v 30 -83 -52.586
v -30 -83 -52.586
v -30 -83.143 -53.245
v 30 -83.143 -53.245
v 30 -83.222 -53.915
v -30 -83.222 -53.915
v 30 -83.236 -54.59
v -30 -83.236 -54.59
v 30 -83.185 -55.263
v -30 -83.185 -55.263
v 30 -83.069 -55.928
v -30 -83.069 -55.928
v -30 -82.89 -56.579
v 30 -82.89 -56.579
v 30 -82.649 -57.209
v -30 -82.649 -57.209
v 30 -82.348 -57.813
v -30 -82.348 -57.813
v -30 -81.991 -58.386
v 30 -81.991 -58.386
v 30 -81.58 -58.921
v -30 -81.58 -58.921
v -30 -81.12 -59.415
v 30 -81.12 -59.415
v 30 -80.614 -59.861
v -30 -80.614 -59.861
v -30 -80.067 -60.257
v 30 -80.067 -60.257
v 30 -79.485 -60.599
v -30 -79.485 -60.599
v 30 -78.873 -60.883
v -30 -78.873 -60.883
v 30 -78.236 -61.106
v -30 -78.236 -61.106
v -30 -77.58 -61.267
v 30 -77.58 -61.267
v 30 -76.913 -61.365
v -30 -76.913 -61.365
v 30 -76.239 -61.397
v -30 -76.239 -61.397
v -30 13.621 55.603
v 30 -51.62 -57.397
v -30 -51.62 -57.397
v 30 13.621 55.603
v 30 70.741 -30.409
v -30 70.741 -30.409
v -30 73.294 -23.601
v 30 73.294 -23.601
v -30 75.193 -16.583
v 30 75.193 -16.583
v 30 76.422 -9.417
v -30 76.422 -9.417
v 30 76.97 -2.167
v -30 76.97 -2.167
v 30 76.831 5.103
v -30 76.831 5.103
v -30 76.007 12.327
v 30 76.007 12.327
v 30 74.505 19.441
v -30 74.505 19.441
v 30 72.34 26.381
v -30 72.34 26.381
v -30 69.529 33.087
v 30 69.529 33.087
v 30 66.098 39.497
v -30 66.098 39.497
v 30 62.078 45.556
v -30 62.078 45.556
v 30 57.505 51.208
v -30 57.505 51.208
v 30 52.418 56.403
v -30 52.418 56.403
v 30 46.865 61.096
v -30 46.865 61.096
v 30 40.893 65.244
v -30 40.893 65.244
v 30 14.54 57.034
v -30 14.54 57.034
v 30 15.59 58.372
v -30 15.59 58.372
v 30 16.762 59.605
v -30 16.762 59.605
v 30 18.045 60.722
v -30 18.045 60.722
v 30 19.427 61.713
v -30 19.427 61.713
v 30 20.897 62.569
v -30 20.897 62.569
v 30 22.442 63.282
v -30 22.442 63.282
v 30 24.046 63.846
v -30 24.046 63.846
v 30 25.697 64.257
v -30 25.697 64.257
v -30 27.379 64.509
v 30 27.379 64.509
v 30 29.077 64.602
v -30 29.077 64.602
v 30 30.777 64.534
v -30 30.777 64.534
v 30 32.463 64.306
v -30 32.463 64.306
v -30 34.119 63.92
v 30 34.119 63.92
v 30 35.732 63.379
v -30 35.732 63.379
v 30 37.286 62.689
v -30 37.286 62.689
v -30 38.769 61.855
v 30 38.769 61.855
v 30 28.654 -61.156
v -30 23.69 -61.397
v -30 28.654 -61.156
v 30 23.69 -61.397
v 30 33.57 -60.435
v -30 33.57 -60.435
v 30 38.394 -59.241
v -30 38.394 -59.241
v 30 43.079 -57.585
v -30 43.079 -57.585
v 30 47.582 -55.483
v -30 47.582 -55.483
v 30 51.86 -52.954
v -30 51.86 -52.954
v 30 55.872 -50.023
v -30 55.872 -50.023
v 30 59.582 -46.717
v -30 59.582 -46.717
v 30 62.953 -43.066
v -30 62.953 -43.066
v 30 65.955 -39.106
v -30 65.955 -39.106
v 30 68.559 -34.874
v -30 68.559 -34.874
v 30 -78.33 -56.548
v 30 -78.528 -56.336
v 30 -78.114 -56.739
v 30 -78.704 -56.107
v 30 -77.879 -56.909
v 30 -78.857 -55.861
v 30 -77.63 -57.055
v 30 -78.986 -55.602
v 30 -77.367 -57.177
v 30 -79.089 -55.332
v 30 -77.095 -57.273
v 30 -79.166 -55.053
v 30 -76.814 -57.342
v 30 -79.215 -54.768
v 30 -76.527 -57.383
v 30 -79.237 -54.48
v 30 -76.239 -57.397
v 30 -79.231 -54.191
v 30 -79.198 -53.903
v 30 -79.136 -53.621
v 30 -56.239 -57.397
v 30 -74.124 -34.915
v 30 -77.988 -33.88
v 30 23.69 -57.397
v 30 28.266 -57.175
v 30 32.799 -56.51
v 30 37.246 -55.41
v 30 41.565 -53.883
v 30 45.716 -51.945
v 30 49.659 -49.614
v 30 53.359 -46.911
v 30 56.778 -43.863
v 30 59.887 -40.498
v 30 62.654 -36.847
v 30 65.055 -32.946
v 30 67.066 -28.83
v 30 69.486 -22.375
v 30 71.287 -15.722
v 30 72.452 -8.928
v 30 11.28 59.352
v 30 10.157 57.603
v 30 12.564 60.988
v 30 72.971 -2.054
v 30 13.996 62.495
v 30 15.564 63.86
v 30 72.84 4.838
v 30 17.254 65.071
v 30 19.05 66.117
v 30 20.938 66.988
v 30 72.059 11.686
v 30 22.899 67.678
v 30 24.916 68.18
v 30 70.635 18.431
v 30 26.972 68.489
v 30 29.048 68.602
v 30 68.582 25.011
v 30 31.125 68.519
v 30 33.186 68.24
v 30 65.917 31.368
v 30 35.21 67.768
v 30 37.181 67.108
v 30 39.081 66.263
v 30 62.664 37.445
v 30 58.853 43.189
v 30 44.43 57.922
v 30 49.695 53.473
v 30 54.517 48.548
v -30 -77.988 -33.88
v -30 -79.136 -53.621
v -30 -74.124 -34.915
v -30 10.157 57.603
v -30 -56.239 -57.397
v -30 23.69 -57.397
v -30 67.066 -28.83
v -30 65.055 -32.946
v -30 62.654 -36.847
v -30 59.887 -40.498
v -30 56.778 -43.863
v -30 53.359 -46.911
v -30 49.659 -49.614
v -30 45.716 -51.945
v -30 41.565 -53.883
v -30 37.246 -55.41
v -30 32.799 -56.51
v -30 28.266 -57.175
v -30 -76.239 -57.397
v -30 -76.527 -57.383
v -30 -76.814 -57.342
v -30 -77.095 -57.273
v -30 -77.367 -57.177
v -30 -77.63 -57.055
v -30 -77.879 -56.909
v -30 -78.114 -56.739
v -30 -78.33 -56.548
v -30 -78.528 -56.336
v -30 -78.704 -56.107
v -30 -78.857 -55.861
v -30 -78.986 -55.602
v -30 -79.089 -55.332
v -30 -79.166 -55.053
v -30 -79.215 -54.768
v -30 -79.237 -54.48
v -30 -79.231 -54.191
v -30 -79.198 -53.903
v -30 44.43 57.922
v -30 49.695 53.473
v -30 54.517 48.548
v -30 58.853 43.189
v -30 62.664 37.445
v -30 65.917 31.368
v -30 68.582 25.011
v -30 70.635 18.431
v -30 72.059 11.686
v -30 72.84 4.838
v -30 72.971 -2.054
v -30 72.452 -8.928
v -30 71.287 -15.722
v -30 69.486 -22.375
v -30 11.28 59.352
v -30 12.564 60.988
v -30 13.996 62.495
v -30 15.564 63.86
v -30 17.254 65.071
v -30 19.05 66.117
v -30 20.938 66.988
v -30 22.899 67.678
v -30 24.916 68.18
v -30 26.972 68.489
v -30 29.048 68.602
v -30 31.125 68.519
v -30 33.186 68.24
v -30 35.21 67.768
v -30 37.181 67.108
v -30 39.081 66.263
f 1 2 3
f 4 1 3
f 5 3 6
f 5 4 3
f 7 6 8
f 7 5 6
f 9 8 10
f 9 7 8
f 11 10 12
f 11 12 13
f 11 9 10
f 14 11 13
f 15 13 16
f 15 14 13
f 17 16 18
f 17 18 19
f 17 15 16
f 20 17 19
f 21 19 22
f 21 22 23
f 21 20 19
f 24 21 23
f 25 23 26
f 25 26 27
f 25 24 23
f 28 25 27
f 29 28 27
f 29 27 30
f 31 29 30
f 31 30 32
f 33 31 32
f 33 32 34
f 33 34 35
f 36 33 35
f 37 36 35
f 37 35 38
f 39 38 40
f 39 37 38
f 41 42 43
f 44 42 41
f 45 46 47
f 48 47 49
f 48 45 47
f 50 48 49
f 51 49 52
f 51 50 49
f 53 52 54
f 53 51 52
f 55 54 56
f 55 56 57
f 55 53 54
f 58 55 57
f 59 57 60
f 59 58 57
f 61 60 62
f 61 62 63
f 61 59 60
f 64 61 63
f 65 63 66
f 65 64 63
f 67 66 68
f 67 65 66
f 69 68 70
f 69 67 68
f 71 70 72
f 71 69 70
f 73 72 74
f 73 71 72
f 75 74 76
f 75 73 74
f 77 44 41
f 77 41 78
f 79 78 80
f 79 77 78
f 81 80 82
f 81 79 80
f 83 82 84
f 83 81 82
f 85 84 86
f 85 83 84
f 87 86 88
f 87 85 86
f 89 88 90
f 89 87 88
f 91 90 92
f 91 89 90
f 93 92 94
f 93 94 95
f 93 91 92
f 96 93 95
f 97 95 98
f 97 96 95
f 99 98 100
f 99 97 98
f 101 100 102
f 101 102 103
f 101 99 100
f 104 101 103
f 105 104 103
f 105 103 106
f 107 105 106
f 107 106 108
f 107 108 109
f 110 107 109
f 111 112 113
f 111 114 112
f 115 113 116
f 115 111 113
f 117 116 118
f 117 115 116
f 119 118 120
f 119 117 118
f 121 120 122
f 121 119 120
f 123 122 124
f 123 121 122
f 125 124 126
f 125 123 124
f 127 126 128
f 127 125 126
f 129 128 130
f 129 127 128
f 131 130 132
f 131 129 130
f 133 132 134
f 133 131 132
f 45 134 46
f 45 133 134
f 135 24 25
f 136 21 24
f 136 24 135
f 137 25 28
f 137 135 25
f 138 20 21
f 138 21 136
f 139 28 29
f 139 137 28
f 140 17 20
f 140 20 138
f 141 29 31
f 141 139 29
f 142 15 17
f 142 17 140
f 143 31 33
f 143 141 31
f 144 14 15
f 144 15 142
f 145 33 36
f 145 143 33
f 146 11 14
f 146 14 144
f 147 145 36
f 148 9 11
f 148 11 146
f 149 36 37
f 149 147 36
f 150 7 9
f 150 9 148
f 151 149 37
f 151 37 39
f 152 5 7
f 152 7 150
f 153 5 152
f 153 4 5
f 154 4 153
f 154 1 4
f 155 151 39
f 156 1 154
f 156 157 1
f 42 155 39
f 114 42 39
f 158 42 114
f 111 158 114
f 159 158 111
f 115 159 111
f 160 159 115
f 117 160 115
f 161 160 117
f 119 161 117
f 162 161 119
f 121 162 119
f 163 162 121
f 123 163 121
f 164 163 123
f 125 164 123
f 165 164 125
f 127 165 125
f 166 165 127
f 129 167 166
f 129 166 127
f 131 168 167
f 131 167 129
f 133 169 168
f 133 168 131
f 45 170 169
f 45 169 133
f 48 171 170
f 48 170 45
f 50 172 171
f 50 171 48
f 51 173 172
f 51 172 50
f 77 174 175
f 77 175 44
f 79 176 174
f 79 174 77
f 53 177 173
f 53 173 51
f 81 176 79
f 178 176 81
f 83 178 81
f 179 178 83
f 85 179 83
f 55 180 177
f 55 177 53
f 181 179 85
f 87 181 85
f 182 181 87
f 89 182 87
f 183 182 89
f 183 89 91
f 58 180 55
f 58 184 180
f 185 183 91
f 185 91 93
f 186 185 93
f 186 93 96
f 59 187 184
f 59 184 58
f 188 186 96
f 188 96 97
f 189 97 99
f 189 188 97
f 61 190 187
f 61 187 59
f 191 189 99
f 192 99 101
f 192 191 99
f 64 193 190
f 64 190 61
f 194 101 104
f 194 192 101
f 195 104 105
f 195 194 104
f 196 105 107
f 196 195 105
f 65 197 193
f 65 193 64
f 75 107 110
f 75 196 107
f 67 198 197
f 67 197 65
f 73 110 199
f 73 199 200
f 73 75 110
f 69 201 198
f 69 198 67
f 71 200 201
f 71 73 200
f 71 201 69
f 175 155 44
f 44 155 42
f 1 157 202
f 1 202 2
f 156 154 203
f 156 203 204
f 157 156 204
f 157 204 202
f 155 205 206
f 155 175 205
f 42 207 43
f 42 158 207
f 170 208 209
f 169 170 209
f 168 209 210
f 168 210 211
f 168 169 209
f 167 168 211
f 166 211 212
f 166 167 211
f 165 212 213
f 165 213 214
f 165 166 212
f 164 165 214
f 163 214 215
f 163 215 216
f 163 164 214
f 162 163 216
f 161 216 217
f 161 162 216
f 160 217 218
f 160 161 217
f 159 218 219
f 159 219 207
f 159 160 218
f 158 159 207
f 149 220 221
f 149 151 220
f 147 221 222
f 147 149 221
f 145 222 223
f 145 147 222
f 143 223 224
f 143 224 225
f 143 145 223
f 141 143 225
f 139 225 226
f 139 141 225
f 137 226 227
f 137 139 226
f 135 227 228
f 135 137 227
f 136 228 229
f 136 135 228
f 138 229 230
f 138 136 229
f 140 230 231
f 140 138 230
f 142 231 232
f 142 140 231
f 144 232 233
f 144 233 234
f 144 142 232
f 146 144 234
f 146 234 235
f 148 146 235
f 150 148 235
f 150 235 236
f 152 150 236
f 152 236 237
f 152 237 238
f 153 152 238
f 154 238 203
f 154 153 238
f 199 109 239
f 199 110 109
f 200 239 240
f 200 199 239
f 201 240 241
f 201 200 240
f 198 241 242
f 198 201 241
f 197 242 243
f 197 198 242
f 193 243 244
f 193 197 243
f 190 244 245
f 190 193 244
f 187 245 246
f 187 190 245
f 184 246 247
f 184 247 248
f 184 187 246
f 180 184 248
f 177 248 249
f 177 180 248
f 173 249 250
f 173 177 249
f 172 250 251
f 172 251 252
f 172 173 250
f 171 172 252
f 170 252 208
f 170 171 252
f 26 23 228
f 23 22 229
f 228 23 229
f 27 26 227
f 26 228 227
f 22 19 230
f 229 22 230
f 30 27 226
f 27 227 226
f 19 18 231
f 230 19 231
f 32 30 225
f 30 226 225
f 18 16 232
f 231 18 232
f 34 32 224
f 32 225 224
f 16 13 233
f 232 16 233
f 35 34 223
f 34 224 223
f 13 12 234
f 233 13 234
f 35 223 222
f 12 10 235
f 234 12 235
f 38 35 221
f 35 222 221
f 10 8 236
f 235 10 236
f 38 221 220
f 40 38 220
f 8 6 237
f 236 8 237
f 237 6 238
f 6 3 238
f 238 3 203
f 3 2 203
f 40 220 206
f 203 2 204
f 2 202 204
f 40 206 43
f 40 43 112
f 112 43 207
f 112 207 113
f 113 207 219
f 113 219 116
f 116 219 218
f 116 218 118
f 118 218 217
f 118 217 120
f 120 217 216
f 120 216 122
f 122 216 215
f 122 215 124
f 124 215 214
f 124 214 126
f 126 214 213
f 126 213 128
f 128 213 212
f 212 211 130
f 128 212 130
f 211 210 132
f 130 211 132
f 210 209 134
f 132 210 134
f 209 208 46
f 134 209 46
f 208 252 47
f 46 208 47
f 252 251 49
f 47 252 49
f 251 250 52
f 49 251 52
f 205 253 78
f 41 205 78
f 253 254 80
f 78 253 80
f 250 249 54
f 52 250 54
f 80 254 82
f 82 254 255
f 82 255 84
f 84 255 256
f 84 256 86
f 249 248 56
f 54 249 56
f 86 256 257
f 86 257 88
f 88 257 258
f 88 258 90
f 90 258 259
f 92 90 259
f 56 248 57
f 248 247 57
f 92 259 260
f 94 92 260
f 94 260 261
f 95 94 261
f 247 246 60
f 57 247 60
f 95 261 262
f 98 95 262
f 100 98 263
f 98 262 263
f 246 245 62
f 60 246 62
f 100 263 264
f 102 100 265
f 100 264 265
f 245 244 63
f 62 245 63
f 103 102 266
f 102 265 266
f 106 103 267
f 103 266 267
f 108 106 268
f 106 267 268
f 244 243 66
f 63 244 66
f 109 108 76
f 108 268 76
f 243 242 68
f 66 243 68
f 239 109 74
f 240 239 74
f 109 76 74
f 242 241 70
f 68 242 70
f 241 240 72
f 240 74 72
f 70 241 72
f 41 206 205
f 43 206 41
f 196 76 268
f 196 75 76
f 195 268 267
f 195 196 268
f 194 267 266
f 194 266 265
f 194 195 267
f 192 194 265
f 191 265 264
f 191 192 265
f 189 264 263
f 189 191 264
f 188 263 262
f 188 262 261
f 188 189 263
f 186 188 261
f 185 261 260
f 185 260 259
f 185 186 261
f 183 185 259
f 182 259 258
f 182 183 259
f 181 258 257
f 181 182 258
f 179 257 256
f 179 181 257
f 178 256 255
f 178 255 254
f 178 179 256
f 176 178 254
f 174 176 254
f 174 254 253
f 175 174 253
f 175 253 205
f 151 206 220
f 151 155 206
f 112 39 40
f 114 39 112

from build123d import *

# Parameters (mm, degrees)
F1_DEPTH = 30


with BuildPart() as f1:
    # F0 (on Right) → F1 (new body, symmetric)
    with BuildSketch(Plane.YZ):
        with BuildLine():
            ThreePointArc((-76.238519, -57.397258), (-78.618579, -56.223542), (-79.136297, -53.620801))
            Line((-79.136297, -53.620801), (-74.124065, -34.914896))
            Line((-74.124065, -34.914896), (-77.987768, -33.87962))
            Line((-77.987768, -33.87962), (-83, -52.585524))
            ThreePointArc((-83, -52.585524), (-81.791993, -58.658588), (-76.238519, -61.397258))
            Line((-76.238519, -61.397258), (23.690404, -61.397258))
            ThreePointArc((23.690404, -61.397258), (51.859532, -52.954337), (70.740883, -30.409332))
            ThreePointArc((70.740883, -30.409332), (73.50453, 22.936522), (40.893049, 65.243839))
            ThreePointArc((40.893049, 65.243839), (23.901637, 67.952883), (10.156762, 57.602742))
            Line((10.156762, 57.602742), (-56.238519, -57.397258))
            Line((-56.238519, -57.397258), (-76.238519, -57.397258))
        make_face()
        with BuildLine():
            ThreePointArc((13.620863, 55.602742), (24.86667, 64.071039), (38.768735, 61.854549))
            ThreePointArc((38.768735, 61.854549), (69.686113, 21.745014), (67.066032, -28.829626))
            ThreePointArc((67.066032, -28.829626), (49.659399, -49.613767), (23.690404, -57.397258))
            Line((23.690404, -57.397258), (-51.619717, -57.397258))
            Line((-51.619717, -57.397258), (13.620863, 55.602742))
        make_face(mode=Mode.SUBTRACT)
    extrude(amount=F1_DEPTH, both=True)


solid = f1.part
